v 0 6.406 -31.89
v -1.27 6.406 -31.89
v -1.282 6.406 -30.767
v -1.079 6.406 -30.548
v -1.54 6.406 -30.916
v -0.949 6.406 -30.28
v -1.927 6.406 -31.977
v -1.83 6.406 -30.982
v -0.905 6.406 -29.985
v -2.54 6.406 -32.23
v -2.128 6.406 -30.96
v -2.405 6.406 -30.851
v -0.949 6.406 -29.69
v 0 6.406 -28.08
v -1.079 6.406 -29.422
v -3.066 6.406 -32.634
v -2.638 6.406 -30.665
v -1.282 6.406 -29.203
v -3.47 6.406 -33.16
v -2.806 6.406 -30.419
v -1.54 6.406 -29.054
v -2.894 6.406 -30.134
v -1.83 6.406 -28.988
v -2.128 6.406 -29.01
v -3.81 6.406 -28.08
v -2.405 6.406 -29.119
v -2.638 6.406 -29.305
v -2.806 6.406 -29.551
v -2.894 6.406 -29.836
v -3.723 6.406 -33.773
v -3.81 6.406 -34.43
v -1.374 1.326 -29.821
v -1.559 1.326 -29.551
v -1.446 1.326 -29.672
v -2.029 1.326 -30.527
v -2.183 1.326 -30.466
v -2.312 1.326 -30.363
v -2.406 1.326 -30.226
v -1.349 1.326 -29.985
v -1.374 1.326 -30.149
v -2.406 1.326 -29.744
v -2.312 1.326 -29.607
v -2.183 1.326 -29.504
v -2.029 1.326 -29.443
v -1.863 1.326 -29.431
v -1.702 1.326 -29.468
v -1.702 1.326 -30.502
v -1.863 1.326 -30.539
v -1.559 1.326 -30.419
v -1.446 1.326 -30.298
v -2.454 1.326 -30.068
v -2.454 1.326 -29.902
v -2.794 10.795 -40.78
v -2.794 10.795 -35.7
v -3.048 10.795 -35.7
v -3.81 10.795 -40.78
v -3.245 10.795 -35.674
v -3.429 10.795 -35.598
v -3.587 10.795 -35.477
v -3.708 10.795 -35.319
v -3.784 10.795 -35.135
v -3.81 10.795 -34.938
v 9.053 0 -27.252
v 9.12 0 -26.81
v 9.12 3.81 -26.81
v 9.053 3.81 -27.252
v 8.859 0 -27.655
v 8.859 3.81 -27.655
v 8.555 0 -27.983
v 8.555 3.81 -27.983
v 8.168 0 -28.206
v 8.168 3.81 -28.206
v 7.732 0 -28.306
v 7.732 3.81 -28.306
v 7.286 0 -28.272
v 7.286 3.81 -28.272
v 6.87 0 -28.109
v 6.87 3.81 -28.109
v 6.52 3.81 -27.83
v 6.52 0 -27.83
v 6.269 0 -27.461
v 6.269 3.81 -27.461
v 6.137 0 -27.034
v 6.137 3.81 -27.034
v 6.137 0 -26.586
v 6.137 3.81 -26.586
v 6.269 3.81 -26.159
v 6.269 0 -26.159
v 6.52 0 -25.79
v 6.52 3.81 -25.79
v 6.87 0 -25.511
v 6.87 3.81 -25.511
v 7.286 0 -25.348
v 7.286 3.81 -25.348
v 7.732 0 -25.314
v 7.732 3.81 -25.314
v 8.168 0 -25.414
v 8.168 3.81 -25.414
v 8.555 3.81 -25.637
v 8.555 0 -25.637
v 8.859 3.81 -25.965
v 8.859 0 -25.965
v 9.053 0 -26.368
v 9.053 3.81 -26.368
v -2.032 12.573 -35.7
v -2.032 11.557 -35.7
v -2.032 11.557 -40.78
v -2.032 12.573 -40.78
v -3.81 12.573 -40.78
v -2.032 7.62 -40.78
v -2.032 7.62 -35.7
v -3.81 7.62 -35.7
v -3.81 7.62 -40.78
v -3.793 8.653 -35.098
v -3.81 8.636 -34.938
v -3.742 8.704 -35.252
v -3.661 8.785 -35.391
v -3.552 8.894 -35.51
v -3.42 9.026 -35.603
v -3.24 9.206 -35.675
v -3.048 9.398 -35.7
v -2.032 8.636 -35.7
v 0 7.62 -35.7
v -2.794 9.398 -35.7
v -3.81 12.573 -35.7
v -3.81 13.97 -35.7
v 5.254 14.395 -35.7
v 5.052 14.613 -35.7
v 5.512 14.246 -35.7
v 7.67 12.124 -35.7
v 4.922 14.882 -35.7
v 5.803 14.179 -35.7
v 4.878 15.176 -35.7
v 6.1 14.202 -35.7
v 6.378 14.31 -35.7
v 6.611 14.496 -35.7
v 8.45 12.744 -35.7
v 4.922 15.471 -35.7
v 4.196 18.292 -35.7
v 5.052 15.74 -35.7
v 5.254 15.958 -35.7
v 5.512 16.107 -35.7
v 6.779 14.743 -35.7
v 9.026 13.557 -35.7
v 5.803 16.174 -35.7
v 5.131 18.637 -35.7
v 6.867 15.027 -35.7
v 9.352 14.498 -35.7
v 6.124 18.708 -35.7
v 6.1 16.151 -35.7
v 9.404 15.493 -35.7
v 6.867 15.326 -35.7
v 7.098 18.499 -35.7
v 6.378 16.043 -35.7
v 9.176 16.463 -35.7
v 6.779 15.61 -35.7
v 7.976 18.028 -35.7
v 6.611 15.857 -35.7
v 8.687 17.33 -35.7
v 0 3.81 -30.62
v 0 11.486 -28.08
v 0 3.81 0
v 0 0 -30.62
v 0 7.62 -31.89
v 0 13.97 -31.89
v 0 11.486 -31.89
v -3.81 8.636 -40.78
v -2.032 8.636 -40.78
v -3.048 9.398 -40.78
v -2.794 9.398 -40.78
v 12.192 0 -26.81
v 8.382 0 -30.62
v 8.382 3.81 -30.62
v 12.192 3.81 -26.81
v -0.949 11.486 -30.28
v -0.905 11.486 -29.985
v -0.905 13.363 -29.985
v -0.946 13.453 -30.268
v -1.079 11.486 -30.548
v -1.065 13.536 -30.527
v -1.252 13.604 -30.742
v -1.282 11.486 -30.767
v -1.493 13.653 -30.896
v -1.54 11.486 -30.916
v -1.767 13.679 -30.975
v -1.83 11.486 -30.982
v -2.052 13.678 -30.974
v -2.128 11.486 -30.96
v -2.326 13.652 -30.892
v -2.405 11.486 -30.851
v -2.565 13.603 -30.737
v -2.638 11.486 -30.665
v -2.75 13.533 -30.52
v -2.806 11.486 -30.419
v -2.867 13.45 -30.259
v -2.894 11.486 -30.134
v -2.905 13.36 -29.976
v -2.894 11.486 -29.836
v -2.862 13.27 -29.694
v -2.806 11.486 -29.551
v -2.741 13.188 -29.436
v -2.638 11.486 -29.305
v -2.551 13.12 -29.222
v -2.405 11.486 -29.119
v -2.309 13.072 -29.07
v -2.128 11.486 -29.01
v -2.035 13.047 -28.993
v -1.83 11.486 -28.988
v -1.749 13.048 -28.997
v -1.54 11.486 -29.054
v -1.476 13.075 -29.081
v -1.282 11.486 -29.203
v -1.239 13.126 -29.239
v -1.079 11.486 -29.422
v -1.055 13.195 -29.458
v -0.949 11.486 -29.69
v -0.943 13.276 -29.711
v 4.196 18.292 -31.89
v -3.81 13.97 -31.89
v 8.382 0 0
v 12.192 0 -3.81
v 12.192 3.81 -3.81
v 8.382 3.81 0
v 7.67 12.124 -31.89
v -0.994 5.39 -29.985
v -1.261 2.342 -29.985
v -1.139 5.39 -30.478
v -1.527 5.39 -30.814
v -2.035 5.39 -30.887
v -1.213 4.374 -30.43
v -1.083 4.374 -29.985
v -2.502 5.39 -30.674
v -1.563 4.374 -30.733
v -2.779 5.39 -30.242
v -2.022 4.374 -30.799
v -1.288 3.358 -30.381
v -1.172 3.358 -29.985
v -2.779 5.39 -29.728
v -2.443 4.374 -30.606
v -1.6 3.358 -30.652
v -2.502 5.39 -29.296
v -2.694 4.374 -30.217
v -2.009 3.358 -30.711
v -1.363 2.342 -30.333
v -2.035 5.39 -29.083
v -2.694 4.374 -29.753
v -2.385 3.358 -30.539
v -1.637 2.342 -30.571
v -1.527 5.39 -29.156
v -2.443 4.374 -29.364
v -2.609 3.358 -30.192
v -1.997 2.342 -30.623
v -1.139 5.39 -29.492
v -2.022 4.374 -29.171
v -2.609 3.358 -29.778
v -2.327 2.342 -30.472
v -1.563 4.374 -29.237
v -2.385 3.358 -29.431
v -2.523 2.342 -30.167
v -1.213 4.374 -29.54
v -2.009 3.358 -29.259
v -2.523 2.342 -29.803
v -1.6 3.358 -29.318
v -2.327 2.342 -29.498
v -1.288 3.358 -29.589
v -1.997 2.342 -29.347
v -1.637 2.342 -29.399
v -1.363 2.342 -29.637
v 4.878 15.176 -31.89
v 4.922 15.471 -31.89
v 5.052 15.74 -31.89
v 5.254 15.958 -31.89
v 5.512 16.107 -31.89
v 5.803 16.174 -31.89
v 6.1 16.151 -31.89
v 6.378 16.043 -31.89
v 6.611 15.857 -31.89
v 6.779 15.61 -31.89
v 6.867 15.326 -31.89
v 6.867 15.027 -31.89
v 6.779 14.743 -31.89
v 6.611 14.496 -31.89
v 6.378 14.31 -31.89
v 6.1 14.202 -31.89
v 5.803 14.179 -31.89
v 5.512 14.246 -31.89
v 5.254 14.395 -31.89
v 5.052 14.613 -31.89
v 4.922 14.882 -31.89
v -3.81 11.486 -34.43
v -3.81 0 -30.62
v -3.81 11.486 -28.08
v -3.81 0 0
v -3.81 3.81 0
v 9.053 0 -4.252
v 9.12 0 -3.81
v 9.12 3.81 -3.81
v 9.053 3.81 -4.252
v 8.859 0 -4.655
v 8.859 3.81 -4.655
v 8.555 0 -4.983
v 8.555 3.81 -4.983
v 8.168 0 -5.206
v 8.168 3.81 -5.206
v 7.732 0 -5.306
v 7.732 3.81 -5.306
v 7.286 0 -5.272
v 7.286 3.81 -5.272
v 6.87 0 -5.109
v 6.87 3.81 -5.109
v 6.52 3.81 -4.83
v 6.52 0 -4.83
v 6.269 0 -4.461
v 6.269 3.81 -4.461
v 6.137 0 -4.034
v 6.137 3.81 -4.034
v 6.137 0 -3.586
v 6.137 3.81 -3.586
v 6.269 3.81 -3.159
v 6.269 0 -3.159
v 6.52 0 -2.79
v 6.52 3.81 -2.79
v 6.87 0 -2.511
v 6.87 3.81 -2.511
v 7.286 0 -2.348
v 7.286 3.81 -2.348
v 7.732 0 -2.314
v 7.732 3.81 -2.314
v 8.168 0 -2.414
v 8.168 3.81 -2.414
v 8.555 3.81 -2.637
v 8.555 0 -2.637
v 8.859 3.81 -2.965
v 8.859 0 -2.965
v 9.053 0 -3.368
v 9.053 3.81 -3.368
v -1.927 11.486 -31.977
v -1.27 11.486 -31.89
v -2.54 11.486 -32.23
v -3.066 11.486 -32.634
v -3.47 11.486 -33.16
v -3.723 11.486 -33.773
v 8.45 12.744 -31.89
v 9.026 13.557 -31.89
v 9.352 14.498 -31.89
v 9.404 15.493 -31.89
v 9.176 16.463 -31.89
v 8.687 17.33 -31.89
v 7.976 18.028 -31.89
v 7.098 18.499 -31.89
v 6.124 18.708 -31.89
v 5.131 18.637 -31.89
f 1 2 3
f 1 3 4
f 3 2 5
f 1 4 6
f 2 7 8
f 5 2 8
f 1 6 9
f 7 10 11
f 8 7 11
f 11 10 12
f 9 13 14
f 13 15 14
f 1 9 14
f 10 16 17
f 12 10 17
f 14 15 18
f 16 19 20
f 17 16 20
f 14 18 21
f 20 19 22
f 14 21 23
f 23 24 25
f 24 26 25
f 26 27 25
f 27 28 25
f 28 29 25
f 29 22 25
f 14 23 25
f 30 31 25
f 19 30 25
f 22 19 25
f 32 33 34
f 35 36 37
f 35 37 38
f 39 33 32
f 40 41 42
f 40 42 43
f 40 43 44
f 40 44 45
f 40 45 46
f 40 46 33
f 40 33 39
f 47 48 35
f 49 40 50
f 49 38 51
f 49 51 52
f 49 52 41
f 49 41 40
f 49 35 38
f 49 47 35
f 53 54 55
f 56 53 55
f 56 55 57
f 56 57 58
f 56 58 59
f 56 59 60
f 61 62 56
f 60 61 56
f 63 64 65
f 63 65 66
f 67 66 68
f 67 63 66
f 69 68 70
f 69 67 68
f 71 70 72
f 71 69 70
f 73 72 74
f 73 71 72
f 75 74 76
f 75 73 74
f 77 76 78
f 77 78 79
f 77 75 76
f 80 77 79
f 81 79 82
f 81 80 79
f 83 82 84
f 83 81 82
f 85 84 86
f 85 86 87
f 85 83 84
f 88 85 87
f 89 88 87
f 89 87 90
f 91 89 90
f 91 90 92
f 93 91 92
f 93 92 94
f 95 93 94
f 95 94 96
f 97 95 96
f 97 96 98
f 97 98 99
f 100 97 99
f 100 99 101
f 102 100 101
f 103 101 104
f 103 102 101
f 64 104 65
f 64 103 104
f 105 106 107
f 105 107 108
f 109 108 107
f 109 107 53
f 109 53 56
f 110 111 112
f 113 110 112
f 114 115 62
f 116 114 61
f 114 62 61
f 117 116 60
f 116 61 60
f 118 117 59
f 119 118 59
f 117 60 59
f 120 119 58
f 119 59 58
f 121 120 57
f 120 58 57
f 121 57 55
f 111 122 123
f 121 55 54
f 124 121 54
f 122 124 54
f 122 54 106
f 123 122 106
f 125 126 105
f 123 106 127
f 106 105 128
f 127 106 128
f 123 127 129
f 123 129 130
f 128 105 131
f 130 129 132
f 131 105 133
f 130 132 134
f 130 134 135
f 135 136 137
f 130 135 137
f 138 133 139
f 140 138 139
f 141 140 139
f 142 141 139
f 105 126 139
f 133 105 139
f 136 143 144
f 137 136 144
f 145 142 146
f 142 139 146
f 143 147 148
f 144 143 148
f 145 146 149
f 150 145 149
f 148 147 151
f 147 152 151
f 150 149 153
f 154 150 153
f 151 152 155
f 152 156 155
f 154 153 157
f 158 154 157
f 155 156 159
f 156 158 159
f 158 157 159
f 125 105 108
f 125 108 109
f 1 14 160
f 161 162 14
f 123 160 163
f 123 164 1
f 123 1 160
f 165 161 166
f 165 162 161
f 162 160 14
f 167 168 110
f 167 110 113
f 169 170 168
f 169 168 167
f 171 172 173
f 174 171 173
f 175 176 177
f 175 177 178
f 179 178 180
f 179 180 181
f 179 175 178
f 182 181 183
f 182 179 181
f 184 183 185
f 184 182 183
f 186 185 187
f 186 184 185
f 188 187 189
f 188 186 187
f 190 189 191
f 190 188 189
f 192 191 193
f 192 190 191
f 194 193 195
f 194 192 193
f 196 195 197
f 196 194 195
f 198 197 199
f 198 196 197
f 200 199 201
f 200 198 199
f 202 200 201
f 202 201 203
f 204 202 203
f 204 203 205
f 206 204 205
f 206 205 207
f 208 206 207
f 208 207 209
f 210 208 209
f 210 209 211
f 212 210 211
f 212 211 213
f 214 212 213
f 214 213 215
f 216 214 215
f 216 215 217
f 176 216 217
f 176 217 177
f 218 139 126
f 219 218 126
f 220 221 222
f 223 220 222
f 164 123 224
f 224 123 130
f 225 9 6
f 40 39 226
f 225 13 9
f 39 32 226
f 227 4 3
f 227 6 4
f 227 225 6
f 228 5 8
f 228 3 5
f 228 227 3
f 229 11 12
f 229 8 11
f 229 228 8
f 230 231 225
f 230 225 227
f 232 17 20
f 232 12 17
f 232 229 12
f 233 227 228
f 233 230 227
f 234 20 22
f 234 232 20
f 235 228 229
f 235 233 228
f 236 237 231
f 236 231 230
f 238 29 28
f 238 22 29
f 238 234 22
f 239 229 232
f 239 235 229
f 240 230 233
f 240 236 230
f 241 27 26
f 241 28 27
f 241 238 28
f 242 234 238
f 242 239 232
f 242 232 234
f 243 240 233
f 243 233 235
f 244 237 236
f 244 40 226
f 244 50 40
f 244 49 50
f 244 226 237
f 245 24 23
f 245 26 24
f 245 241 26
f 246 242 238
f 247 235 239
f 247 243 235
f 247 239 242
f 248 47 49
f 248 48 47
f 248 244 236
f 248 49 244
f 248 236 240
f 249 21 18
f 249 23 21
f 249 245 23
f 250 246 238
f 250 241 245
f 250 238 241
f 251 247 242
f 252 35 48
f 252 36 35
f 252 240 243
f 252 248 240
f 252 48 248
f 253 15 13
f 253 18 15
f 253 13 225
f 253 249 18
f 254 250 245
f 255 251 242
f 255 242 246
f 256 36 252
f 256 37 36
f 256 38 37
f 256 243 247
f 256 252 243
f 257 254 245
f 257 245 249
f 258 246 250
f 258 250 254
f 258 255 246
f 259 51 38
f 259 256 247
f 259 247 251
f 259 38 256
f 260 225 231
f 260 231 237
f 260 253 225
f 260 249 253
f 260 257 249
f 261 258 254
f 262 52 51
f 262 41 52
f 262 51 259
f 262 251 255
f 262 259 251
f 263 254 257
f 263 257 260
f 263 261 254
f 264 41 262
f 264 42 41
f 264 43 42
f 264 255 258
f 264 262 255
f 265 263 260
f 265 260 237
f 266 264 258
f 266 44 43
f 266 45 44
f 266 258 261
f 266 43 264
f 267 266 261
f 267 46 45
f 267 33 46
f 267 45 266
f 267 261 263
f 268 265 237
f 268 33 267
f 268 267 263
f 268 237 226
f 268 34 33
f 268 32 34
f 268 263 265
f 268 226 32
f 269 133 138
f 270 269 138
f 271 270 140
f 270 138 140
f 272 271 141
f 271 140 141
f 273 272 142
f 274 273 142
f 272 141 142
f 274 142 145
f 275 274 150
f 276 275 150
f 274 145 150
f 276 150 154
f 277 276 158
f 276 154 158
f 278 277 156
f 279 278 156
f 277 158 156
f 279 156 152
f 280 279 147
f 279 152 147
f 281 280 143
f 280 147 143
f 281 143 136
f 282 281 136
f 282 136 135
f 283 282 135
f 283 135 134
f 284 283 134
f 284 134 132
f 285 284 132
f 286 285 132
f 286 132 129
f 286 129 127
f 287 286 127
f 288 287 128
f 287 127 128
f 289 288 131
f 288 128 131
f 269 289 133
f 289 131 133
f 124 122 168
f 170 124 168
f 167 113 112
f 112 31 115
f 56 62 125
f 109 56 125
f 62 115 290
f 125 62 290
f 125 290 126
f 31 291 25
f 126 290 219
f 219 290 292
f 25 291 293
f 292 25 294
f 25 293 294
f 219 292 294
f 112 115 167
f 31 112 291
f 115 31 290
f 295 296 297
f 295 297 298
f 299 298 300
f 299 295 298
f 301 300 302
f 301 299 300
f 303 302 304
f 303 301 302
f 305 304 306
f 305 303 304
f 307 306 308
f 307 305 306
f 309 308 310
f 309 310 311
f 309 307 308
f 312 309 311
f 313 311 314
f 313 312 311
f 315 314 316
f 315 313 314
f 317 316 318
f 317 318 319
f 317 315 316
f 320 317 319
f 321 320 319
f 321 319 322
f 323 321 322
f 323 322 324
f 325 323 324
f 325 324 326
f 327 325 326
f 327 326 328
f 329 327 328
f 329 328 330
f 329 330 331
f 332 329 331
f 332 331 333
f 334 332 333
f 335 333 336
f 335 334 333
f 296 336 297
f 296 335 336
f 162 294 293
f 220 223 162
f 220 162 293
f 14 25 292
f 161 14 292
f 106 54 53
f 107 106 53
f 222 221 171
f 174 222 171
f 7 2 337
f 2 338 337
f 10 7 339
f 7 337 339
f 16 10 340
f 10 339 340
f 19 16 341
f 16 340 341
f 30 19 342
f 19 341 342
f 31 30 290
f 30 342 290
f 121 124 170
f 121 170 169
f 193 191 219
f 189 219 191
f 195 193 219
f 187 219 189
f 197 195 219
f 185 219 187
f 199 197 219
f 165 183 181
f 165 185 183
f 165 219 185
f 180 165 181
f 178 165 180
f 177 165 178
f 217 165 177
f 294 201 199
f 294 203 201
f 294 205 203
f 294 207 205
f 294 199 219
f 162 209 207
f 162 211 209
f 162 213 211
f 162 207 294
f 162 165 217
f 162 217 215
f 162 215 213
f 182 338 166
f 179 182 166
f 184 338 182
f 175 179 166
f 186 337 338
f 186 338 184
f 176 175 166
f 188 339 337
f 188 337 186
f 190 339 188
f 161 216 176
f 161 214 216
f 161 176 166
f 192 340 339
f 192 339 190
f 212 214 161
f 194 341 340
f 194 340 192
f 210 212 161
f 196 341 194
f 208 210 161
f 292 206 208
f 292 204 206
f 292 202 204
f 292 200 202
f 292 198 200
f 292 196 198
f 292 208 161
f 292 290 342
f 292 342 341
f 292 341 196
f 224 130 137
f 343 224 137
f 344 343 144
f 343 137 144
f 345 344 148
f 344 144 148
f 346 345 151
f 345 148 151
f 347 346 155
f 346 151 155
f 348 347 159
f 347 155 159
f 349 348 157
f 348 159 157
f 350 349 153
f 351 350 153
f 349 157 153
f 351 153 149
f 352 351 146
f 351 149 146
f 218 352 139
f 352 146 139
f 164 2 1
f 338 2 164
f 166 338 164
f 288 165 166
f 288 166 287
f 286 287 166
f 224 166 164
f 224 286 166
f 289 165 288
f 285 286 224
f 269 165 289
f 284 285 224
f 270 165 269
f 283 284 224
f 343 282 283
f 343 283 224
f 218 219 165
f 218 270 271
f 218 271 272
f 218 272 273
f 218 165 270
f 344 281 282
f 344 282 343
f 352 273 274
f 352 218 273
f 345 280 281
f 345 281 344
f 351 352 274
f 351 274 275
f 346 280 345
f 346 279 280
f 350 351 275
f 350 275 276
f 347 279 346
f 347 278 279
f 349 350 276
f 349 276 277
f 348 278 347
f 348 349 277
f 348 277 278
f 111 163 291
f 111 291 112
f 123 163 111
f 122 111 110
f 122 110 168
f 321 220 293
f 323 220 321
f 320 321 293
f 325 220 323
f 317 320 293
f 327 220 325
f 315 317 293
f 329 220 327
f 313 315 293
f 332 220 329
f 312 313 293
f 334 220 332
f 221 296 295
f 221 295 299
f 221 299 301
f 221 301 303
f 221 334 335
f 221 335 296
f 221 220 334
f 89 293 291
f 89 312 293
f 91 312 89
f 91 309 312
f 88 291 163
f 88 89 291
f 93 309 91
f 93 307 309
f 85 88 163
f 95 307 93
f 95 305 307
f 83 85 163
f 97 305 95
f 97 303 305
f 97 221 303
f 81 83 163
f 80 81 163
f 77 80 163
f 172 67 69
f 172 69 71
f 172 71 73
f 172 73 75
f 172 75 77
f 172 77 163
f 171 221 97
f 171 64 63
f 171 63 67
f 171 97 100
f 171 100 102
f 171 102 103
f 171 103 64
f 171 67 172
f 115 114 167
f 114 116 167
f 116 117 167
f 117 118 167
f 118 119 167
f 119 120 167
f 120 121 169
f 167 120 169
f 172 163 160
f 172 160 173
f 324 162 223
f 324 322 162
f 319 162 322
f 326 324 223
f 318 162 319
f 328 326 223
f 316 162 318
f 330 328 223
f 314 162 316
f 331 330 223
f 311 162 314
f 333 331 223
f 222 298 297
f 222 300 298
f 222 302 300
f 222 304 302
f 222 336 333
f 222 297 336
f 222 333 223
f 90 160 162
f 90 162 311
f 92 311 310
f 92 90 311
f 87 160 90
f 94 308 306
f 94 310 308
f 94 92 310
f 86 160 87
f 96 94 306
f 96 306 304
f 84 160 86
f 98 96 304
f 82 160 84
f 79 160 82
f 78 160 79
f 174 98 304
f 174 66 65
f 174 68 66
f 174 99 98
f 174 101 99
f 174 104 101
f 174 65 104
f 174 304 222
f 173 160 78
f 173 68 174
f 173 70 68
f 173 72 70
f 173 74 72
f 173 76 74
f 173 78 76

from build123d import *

# Parameters (mm, degrees)
SKETCH1_W                    = 12.192
SKETCH1_H                    = 30.62
SKETCH1_R                    = 1.5
BOSS_EXTRUDE1_DEPTH          = 3.81
BOSS_EXTRUDE2_DEPTH          = 3.81
SKETCH3_W                    = 1.778
SKETCH3_H                    = 1.778
BOSS_EXTRUDE3_DEPTH          = 5.08
SKETCH4_R                    = 1
BOSS_EXTRUDE4_DEPTH          = 3.81
CUT_EXTRUDE1_REACH           = 18.002
SKETCH5_W                    = 3.81
SKETCH5_H                    = 5.08
SKETCH6_R                    = 1
CUT_EXTRUDE2_DEPTH           = 13.310347601
CUT_EXTRUDE2_OTHER_WAY_DEPTH = 5.08
CUT_EXTRUDE2_OTHER_WAY_TAPER = 5
CHAMFER1_SIZE                = 0.762
FILLET1_R                    = 2.54
CHAMFER2_SIZE                = 3.81
FILLET2_R                    = 0.762


with BuildPart() as part:
    # Sketch1 → Boss-Extrude1 (new body)
    with BuildSketch(Plane(origin=(0, 0, 0), x_dir=(1, 0, 0), z_dir=(0, 1, 0))):
        with Locations((6.096, 15.31)):
            Rectangle(SKETCH1_W, SKETCH1_H)
        with Locations((7.62, 26.81)):
            Circle(SKETCH1_R, mode=Mode.SUBTRACT)
        with Locations((7.62, 3.81)):
            Circle(SKETCH1_R, mode=Mode.SUBTRACT)
    extrude(amount=BOSS_EXTRUDE1_DEPTH)

    # Sketch2 → Boss-Extrude2 (add)
    with BuildSketch(Plane.ZY):
        Polygon((0, 3.81), (0, 0), (-30.62, 0), (-35.7, 7.62), (-35.7, 13.97), (-31.89, 13.97), align=None)
    extrude(amount=BOSS_EXTRUDE2_DEPTH)

    # Sketch3 → Boss-Extrude3 (add)
    with BuildSketch(Plane(origin=(0, 0, -35.7), x_dir=(-1, 0, 0), z_dir=(0, 0, -1))):
        with Locations((2.921, 8.509)):
            Rectangle(SKETCH3_W, SKETCH3_H)
        with Locations((2.921, 11.684)):
            Rectangle(SKETCH3_W, SKETCH3_H)
    extrude(amount=BOSS_EXTRUDE3_DEPTH)

    # Sketch4 → Boss-Extrude4 (add)
    with BuildSketch(Plane(origin=(0, 0, -35.7), x_dir=(-1, 0, 0), z_dir=(0, 0, -1))):
        with BuildLine():
            Line((0, 7.62), (-7.670279519, 12.123848354))
            ThreePointArc((-7.670279519, 12.123848354), (-8.962218829, 16.913759957), (-4.196321779, 18.2916517))
            Line((-4.196321779, 18.2916517), (3.81, 13.97))
            Line((3.81, 13.97), (0, 13.97))
            Line((0, 13.97), (0, 7.62))
        make_face()
        with Locations((-5.877818102, 15.1765)):
            Circle(SKETCH4_R, mode=Mode.SUBTRACT)
    extrude(amount=-BOSS_EXTRUDE4_DEPTH)

    # Sketch5 → Cut-Extrude1 (cut, up to next)
    with BuildSketch(Plane.ZY.offset(3.81), mode=Mode.PRIVATE) as cut_extrude1_sk1:
        with Locations((-29.985, 8.946152399)):
            Rectangle(SKETCH5_W, SKETCH5_H)
    cut_extrude1_tool1 = extrude(cut_extrude1_sk1.sketch, amount=-CUT_EXTRUDE1_REACH, mode=Mode.PRIVATE) & part.part
    add(cut_extrude1_tool1.solids().sort_by_distance((-3.81, 8.946152, -29.985))[0], mode=Mode.SUBTRACT)

    # Sketch6 → Cut-Extrude2 (cut)
    with BuildSketch(Plane(origin=(0, 6.406152399, 0), x_dir=(1, 0, 0), z_dir=(0, 1, 0))):
        with Locations((-1.905, 29.985)):
            Circle(SKETCH6_R)
    extrude(amount=CUT_EXTRUDE2_DEPTH, mode=Mode.SUBTRACT)

    # Sketch6 → Cut-Extrude2 other way (cut)
    with BuildSketch(Plane(origin=(0, 6.406152399, 0), x_dir=(1, 0, 0), z_dir=(0, 1, 0))):
        with Locations((-1.905, 29.985)):
            Circle(SKETCH6_R)
    extrude(amount=-CUT_EXTRUDE2_OTHER_WAY_DEPTH, taper=CUT_EXTRUDE2_OTHER_WAY_TAPER, mode=Mode.SUBTRACT)

    # Chamfer1
    chamfer1_edges = [part.edges().sort_by_distance(p)[0] for p in [
        (-3.81, 9.398, -38.24),
        (-2.032, 9.398, -38.24),
        (-2.032, 10.795, -38.24),
    ]]
    chamfer(chamfer1_edges, length=CHAMFER1_SIZE)

    # Fillet1
    fillet1_edges = [part.edges().sort_by_distance(p)[0] for p in [
        (-3.81, 8.946152399, -31.89),
    ]]
    fillet(fillet1_edges, radius=FILLET1_R)

    # Chamfer2
    chamfer2_edges = [part.edges().sort_by_distance(p)[0] for p in [
        (12.192, 1.905, -30.62),
        (12.192, 1.905, 0),
    ]]
    chamfer(chamfer2_edges, length=CHAMFER2_SIZE)

    # Fillet2
    fillet2_edges = [part.edges().sort_by_distance(p)[0] for p in [
        (-3.81, 10.0965, -35.7),
    ]]
    fillet(fillet2_edges, radius=FILLET2_R)


solid = part.part
